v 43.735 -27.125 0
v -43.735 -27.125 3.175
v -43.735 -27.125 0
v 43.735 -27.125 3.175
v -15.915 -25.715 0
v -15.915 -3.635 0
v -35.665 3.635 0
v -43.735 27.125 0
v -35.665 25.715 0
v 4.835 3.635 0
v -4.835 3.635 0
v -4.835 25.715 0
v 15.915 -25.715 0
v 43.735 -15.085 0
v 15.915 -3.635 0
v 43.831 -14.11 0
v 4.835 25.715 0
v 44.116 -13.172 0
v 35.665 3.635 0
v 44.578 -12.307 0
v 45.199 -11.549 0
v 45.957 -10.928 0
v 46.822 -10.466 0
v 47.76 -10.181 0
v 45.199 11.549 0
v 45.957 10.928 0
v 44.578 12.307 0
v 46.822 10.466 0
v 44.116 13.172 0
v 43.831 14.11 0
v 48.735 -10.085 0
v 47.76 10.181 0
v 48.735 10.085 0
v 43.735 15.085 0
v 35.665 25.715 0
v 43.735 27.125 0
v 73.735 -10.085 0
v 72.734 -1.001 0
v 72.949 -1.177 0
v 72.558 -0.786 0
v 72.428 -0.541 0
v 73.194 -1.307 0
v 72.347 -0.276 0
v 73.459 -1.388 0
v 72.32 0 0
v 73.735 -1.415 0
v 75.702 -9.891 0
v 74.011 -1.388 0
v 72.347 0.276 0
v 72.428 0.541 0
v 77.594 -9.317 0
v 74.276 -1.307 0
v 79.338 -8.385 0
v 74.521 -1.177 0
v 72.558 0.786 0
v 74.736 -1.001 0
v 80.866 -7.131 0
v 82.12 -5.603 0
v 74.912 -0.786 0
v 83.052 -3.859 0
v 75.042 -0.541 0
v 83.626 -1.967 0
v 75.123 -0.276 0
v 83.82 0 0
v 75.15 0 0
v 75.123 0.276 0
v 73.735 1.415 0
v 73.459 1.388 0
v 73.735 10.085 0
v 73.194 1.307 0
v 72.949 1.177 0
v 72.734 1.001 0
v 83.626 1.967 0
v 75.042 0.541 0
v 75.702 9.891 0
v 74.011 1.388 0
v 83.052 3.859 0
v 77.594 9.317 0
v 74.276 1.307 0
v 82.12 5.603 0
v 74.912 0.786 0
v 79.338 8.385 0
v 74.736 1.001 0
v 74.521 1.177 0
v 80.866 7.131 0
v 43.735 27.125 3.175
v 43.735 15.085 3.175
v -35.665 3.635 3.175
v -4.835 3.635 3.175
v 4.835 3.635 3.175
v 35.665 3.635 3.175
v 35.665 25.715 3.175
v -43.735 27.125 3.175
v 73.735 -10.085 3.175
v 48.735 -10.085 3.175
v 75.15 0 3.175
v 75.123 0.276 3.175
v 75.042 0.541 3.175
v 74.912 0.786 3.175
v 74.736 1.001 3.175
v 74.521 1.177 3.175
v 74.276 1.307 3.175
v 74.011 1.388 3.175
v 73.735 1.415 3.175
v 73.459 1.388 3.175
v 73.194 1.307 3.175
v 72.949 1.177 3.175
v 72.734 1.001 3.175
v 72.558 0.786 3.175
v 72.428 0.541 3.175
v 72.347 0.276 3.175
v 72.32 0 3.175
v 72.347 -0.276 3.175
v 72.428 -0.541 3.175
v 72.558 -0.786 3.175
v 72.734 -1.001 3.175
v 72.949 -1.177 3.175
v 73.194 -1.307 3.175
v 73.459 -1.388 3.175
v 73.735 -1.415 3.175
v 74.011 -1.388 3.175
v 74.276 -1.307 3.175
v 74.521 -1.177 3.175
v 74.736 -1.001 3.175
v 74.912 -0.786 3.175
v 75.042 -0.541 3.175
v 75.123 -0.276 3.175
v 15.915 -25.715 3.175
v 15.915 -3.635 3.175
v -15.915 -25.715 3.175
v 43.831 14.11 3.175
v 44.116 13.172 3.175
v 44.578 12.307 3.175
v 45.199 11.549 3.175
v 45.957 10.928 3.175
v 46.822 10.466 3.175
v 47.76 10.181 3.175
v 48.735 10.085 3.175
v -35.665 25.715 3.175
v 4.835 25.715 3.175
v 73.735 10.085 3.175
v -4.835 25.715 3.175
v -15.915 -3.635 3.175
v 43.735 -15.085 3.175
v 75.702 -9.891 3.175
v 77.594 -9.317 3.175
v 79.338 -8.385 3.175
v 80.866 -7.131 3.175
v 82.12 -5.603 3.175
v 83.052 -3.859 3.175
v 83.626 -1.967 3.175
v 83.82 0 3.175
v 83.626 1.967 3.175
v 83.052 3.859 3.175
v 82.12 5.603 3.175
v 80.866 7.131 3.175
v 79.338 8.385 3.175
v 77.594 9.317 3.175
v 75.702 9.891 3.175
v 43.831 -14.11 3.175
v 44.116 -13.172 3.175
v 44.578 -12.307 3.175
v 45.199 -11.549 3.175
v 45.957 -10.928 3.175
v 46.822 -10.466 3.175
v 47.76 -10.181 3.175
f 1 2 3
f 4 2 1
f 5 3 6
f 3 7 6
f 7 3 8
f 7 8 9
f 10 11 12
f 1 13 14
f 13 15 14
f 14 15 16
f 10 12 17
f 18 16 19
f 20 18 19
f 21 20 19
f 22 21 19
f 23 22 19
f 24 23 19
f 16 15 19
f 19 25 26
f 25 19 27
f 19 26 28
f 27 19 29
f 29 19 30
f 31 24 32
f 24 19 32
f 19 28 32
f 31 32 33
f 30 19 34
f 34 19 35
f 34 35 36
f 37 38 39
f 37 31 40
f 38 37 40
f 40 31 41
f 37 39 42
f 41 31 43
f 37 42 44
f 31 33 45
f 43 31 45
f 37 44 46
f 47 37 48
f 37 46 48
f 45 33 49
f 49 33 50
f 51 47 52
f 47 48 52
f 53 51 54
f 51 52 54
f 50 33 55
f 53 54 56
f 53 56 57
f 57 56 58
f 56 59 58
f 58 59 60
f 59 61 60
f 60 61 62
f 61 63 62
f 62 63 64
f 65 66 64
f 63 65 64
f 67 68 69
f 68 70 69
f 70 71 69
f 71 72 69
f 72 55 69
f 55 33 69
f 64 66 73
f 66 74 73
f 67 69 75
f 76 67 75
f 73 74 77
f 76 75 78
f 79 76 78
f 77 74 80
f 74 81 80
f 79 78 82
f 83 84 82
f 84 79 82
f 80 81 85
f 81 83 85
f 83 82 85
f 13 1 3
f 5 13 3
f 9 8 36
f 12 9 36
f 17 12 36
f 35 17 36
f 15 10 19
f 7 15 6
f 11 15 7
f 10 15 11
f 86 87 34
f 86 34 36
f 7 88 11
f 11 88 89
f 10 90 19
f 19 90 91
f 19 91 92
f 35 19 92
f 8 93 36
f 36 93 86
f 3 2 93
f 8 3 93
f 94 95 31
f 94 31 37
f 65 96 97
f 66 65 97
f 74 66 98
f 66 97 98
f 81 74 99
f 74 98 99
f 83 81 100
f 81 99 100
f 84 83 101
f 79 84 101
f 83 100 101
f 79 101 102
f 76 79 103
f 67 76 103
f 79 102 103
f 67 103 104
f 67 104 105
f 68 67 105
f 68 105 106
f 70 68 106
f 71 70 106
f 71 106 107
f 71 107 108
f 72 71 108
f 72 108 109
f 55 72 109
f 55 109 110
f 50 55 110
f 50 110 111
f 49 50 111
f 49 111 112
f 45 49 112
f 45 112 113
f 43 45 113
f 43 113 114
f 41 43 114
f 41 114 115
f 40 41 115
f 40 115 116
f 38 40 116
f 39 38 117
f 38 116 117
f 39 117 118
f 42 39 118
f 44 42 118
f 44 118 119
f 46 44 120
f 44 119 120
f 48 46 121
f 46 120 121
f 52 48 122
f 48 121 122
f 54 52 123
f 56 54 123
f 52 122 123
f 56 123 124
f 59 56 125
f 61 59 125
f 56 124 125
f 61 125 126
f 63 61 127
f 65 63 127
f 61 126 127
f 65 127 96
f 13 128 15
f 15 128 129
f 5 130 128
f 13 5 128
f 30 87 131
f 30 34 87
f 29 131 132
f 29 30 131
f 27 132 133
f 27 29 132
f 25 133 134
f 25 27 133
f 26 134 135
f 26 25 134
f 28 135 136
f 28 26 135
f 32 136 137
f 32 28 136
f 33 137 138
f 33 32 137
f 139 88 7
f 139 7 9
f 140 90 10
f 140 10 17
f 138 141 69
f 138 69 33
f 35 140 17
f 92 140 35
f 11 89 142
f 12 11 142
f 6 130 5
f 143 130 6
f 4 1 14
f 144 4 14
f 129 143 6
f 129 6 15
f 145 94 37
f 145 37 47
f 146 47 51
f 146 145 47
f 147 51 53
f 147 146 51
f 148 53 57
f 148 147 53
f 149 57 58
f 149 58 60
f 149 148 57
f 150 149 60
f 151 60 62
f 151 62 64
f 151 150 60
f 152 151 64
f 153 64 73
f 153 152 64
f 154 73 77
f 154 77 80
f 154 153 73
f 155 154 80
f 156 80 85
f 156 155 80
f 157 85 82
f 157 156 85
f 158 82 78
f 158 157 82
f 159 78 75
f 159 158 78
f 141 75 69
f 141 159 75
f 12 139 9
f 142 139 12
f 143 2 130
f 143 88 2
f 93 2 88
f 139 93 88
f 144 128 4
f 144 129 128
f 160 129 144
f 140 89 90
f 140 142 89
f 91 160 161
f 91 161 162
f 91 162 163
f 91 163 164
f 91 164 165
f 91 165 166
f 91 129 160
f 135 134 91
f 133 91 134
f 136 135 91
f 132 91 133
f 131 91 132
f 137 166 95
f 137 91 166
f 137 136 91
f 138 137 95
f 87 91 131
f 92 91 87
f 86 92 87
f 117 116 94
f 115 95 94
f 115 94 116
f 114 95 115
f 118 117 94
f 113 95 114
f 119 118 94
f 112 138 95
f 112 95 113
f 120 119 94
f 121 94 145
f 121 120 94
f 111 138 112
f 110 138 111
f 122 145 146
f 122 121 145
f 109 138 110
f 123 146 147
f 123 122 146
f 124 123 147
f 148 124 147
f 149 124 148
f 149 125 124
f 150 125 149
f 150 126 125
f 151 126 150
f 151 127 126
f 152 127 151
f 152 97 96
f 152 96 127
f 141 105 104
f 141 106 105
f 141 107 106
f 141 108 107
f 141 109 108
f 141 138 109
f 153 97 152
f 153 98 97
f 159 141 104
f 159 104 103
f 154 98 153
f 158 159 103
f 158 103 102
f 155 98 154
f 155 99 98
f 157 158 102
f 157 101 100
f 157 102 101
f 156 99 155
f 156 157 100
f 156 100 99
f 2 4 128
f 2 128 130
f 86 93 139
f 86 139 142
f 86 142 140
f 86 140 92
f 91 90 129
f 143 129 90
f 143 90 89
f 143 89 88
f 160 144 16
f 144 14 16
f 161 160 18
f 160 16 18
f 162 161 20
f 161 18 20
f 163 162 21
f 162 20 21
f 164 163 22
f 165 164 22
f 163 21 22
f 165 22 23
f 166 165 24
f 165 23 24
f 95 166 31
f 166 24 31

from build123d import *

# Parameters (mm, degrees)
SKETCH1_W           = 87.47
SKETCH1_H           = 60.6
BOSS_EXTRUDE1_DEPTH = 3.175
BOSS_EXTRUDE2_DEPTH = 3.175
FILLET1_R           = 5
SKETCH5_R           = 1.415
CUT_EXTRUDE2_DEPTH  = 10
SKETCH6_W           = 87.47
SKETCH6_H           = 3.265
CUT_EXTRUDE3_DEPTH  = 10
SKETCH2_W           = 30.83
SKETCH2_H           = 22.08
SKETCH2_W_2         = 31.83
CUT_EXTRUDE4_DEPTH  = 10
SKETCH8_W           = 87.47
SKETCH8_H           = 0.09
BOSS_EXTRUDE3_DEPTH = 3.175


with BuildPart() as part:
    # Sketch1 → Boss-Extrude1 (new body)
    with BuildSketch(Plane.XY):
        Rectangle(SKETCH1_W, SKETCH1_H)
    extrude(amount=BOSS_EXTRUDE1_DEPTH)

    # Sketch3 → Boss-Extrude2 (add)
    with BuildSketch(Plane.XY.offset(3.175)):
        with BuildLine():
            Line((43.735, 10.085), (43.735, -10.085))
            Line((43.735, -10.085), (73.735, -10.085))
            ThreePointArc((73.735, -10.085), (83.82, 0), (73.735, 10.085))
            Line((73.735, 10.085), (43.735, 10.085))
        make_face()
    extrude(amount=-BOSS_EXTRUDE2_DEPTH)

    # Fillet1
    fillet1_edges = [part.edges().sort_by_distance(p)[0] for p in [
        (43.735, -10.085, 1.5875),
        (43.735, 10.085, 1.5875),
    ]]
    fillet(fillet1_edges, radius=FILLET1_R)

    # Sketch5 → Cut-Extrude2 (cut)
    with BuildSketch(Plane.XY.offset(3.175)):
        with Locations((73.735, 0)):
            Circle(SKETCH5_R)
    extrude(amount=-CUT_EXTRUDE2_DEPTH, mode=Mode.SUBTRACT)

    # Sketch6 → Cut-Extrude3 (cut)
    with BuildSketch(Plane.XY.offset(3.175)):
        with Locations((0, 28.6675)):
            Rectangle(SKETCH6_W, SKETCH6_H)
        with Locations((0, -28.6675)):
            Rectangle(SKETCH6_W, SKETCH6_H)
    extrude(amount=-CUT_EXTRUDE3_DEPTH, mode=Mode.SUBTRACT)

    # Sketch2 → Cut-Extrude4 (cut)
    with BuildSketch(Plane.XY.offset(3.175)):
        with Locations((20.25, 14.675)):
            Rectangle(SKETCH2_W, SKETCH2_H)
        with Locations((-20.25, 14.675)):
            Rectangle(SKETCH2_W, SKETCH2_H)
        with Locations((0, -14.675)):
            Rectangle(SKETCH2_W_2, SKETCH2_H)
    extrude(amount=-CUT_EXTRUDE4_DEPTH, mode=Mode.SUBTRACT)

    # Sketch8 → Boss-Extrude3 (add)
    with BuildSketch(Plane.XY.offset(3.175)):
        with Locations((0, 27.08)):
            Rectangle(SKETCH8_W, SKETCH8_H)
        with Locations((0, -27.08)):
            Rectangle(SKETCH8_W, SKETCH8_H)
    extrude(amount=-BOSS_EXTRUDE3_DEPTH)


solid = part.part
